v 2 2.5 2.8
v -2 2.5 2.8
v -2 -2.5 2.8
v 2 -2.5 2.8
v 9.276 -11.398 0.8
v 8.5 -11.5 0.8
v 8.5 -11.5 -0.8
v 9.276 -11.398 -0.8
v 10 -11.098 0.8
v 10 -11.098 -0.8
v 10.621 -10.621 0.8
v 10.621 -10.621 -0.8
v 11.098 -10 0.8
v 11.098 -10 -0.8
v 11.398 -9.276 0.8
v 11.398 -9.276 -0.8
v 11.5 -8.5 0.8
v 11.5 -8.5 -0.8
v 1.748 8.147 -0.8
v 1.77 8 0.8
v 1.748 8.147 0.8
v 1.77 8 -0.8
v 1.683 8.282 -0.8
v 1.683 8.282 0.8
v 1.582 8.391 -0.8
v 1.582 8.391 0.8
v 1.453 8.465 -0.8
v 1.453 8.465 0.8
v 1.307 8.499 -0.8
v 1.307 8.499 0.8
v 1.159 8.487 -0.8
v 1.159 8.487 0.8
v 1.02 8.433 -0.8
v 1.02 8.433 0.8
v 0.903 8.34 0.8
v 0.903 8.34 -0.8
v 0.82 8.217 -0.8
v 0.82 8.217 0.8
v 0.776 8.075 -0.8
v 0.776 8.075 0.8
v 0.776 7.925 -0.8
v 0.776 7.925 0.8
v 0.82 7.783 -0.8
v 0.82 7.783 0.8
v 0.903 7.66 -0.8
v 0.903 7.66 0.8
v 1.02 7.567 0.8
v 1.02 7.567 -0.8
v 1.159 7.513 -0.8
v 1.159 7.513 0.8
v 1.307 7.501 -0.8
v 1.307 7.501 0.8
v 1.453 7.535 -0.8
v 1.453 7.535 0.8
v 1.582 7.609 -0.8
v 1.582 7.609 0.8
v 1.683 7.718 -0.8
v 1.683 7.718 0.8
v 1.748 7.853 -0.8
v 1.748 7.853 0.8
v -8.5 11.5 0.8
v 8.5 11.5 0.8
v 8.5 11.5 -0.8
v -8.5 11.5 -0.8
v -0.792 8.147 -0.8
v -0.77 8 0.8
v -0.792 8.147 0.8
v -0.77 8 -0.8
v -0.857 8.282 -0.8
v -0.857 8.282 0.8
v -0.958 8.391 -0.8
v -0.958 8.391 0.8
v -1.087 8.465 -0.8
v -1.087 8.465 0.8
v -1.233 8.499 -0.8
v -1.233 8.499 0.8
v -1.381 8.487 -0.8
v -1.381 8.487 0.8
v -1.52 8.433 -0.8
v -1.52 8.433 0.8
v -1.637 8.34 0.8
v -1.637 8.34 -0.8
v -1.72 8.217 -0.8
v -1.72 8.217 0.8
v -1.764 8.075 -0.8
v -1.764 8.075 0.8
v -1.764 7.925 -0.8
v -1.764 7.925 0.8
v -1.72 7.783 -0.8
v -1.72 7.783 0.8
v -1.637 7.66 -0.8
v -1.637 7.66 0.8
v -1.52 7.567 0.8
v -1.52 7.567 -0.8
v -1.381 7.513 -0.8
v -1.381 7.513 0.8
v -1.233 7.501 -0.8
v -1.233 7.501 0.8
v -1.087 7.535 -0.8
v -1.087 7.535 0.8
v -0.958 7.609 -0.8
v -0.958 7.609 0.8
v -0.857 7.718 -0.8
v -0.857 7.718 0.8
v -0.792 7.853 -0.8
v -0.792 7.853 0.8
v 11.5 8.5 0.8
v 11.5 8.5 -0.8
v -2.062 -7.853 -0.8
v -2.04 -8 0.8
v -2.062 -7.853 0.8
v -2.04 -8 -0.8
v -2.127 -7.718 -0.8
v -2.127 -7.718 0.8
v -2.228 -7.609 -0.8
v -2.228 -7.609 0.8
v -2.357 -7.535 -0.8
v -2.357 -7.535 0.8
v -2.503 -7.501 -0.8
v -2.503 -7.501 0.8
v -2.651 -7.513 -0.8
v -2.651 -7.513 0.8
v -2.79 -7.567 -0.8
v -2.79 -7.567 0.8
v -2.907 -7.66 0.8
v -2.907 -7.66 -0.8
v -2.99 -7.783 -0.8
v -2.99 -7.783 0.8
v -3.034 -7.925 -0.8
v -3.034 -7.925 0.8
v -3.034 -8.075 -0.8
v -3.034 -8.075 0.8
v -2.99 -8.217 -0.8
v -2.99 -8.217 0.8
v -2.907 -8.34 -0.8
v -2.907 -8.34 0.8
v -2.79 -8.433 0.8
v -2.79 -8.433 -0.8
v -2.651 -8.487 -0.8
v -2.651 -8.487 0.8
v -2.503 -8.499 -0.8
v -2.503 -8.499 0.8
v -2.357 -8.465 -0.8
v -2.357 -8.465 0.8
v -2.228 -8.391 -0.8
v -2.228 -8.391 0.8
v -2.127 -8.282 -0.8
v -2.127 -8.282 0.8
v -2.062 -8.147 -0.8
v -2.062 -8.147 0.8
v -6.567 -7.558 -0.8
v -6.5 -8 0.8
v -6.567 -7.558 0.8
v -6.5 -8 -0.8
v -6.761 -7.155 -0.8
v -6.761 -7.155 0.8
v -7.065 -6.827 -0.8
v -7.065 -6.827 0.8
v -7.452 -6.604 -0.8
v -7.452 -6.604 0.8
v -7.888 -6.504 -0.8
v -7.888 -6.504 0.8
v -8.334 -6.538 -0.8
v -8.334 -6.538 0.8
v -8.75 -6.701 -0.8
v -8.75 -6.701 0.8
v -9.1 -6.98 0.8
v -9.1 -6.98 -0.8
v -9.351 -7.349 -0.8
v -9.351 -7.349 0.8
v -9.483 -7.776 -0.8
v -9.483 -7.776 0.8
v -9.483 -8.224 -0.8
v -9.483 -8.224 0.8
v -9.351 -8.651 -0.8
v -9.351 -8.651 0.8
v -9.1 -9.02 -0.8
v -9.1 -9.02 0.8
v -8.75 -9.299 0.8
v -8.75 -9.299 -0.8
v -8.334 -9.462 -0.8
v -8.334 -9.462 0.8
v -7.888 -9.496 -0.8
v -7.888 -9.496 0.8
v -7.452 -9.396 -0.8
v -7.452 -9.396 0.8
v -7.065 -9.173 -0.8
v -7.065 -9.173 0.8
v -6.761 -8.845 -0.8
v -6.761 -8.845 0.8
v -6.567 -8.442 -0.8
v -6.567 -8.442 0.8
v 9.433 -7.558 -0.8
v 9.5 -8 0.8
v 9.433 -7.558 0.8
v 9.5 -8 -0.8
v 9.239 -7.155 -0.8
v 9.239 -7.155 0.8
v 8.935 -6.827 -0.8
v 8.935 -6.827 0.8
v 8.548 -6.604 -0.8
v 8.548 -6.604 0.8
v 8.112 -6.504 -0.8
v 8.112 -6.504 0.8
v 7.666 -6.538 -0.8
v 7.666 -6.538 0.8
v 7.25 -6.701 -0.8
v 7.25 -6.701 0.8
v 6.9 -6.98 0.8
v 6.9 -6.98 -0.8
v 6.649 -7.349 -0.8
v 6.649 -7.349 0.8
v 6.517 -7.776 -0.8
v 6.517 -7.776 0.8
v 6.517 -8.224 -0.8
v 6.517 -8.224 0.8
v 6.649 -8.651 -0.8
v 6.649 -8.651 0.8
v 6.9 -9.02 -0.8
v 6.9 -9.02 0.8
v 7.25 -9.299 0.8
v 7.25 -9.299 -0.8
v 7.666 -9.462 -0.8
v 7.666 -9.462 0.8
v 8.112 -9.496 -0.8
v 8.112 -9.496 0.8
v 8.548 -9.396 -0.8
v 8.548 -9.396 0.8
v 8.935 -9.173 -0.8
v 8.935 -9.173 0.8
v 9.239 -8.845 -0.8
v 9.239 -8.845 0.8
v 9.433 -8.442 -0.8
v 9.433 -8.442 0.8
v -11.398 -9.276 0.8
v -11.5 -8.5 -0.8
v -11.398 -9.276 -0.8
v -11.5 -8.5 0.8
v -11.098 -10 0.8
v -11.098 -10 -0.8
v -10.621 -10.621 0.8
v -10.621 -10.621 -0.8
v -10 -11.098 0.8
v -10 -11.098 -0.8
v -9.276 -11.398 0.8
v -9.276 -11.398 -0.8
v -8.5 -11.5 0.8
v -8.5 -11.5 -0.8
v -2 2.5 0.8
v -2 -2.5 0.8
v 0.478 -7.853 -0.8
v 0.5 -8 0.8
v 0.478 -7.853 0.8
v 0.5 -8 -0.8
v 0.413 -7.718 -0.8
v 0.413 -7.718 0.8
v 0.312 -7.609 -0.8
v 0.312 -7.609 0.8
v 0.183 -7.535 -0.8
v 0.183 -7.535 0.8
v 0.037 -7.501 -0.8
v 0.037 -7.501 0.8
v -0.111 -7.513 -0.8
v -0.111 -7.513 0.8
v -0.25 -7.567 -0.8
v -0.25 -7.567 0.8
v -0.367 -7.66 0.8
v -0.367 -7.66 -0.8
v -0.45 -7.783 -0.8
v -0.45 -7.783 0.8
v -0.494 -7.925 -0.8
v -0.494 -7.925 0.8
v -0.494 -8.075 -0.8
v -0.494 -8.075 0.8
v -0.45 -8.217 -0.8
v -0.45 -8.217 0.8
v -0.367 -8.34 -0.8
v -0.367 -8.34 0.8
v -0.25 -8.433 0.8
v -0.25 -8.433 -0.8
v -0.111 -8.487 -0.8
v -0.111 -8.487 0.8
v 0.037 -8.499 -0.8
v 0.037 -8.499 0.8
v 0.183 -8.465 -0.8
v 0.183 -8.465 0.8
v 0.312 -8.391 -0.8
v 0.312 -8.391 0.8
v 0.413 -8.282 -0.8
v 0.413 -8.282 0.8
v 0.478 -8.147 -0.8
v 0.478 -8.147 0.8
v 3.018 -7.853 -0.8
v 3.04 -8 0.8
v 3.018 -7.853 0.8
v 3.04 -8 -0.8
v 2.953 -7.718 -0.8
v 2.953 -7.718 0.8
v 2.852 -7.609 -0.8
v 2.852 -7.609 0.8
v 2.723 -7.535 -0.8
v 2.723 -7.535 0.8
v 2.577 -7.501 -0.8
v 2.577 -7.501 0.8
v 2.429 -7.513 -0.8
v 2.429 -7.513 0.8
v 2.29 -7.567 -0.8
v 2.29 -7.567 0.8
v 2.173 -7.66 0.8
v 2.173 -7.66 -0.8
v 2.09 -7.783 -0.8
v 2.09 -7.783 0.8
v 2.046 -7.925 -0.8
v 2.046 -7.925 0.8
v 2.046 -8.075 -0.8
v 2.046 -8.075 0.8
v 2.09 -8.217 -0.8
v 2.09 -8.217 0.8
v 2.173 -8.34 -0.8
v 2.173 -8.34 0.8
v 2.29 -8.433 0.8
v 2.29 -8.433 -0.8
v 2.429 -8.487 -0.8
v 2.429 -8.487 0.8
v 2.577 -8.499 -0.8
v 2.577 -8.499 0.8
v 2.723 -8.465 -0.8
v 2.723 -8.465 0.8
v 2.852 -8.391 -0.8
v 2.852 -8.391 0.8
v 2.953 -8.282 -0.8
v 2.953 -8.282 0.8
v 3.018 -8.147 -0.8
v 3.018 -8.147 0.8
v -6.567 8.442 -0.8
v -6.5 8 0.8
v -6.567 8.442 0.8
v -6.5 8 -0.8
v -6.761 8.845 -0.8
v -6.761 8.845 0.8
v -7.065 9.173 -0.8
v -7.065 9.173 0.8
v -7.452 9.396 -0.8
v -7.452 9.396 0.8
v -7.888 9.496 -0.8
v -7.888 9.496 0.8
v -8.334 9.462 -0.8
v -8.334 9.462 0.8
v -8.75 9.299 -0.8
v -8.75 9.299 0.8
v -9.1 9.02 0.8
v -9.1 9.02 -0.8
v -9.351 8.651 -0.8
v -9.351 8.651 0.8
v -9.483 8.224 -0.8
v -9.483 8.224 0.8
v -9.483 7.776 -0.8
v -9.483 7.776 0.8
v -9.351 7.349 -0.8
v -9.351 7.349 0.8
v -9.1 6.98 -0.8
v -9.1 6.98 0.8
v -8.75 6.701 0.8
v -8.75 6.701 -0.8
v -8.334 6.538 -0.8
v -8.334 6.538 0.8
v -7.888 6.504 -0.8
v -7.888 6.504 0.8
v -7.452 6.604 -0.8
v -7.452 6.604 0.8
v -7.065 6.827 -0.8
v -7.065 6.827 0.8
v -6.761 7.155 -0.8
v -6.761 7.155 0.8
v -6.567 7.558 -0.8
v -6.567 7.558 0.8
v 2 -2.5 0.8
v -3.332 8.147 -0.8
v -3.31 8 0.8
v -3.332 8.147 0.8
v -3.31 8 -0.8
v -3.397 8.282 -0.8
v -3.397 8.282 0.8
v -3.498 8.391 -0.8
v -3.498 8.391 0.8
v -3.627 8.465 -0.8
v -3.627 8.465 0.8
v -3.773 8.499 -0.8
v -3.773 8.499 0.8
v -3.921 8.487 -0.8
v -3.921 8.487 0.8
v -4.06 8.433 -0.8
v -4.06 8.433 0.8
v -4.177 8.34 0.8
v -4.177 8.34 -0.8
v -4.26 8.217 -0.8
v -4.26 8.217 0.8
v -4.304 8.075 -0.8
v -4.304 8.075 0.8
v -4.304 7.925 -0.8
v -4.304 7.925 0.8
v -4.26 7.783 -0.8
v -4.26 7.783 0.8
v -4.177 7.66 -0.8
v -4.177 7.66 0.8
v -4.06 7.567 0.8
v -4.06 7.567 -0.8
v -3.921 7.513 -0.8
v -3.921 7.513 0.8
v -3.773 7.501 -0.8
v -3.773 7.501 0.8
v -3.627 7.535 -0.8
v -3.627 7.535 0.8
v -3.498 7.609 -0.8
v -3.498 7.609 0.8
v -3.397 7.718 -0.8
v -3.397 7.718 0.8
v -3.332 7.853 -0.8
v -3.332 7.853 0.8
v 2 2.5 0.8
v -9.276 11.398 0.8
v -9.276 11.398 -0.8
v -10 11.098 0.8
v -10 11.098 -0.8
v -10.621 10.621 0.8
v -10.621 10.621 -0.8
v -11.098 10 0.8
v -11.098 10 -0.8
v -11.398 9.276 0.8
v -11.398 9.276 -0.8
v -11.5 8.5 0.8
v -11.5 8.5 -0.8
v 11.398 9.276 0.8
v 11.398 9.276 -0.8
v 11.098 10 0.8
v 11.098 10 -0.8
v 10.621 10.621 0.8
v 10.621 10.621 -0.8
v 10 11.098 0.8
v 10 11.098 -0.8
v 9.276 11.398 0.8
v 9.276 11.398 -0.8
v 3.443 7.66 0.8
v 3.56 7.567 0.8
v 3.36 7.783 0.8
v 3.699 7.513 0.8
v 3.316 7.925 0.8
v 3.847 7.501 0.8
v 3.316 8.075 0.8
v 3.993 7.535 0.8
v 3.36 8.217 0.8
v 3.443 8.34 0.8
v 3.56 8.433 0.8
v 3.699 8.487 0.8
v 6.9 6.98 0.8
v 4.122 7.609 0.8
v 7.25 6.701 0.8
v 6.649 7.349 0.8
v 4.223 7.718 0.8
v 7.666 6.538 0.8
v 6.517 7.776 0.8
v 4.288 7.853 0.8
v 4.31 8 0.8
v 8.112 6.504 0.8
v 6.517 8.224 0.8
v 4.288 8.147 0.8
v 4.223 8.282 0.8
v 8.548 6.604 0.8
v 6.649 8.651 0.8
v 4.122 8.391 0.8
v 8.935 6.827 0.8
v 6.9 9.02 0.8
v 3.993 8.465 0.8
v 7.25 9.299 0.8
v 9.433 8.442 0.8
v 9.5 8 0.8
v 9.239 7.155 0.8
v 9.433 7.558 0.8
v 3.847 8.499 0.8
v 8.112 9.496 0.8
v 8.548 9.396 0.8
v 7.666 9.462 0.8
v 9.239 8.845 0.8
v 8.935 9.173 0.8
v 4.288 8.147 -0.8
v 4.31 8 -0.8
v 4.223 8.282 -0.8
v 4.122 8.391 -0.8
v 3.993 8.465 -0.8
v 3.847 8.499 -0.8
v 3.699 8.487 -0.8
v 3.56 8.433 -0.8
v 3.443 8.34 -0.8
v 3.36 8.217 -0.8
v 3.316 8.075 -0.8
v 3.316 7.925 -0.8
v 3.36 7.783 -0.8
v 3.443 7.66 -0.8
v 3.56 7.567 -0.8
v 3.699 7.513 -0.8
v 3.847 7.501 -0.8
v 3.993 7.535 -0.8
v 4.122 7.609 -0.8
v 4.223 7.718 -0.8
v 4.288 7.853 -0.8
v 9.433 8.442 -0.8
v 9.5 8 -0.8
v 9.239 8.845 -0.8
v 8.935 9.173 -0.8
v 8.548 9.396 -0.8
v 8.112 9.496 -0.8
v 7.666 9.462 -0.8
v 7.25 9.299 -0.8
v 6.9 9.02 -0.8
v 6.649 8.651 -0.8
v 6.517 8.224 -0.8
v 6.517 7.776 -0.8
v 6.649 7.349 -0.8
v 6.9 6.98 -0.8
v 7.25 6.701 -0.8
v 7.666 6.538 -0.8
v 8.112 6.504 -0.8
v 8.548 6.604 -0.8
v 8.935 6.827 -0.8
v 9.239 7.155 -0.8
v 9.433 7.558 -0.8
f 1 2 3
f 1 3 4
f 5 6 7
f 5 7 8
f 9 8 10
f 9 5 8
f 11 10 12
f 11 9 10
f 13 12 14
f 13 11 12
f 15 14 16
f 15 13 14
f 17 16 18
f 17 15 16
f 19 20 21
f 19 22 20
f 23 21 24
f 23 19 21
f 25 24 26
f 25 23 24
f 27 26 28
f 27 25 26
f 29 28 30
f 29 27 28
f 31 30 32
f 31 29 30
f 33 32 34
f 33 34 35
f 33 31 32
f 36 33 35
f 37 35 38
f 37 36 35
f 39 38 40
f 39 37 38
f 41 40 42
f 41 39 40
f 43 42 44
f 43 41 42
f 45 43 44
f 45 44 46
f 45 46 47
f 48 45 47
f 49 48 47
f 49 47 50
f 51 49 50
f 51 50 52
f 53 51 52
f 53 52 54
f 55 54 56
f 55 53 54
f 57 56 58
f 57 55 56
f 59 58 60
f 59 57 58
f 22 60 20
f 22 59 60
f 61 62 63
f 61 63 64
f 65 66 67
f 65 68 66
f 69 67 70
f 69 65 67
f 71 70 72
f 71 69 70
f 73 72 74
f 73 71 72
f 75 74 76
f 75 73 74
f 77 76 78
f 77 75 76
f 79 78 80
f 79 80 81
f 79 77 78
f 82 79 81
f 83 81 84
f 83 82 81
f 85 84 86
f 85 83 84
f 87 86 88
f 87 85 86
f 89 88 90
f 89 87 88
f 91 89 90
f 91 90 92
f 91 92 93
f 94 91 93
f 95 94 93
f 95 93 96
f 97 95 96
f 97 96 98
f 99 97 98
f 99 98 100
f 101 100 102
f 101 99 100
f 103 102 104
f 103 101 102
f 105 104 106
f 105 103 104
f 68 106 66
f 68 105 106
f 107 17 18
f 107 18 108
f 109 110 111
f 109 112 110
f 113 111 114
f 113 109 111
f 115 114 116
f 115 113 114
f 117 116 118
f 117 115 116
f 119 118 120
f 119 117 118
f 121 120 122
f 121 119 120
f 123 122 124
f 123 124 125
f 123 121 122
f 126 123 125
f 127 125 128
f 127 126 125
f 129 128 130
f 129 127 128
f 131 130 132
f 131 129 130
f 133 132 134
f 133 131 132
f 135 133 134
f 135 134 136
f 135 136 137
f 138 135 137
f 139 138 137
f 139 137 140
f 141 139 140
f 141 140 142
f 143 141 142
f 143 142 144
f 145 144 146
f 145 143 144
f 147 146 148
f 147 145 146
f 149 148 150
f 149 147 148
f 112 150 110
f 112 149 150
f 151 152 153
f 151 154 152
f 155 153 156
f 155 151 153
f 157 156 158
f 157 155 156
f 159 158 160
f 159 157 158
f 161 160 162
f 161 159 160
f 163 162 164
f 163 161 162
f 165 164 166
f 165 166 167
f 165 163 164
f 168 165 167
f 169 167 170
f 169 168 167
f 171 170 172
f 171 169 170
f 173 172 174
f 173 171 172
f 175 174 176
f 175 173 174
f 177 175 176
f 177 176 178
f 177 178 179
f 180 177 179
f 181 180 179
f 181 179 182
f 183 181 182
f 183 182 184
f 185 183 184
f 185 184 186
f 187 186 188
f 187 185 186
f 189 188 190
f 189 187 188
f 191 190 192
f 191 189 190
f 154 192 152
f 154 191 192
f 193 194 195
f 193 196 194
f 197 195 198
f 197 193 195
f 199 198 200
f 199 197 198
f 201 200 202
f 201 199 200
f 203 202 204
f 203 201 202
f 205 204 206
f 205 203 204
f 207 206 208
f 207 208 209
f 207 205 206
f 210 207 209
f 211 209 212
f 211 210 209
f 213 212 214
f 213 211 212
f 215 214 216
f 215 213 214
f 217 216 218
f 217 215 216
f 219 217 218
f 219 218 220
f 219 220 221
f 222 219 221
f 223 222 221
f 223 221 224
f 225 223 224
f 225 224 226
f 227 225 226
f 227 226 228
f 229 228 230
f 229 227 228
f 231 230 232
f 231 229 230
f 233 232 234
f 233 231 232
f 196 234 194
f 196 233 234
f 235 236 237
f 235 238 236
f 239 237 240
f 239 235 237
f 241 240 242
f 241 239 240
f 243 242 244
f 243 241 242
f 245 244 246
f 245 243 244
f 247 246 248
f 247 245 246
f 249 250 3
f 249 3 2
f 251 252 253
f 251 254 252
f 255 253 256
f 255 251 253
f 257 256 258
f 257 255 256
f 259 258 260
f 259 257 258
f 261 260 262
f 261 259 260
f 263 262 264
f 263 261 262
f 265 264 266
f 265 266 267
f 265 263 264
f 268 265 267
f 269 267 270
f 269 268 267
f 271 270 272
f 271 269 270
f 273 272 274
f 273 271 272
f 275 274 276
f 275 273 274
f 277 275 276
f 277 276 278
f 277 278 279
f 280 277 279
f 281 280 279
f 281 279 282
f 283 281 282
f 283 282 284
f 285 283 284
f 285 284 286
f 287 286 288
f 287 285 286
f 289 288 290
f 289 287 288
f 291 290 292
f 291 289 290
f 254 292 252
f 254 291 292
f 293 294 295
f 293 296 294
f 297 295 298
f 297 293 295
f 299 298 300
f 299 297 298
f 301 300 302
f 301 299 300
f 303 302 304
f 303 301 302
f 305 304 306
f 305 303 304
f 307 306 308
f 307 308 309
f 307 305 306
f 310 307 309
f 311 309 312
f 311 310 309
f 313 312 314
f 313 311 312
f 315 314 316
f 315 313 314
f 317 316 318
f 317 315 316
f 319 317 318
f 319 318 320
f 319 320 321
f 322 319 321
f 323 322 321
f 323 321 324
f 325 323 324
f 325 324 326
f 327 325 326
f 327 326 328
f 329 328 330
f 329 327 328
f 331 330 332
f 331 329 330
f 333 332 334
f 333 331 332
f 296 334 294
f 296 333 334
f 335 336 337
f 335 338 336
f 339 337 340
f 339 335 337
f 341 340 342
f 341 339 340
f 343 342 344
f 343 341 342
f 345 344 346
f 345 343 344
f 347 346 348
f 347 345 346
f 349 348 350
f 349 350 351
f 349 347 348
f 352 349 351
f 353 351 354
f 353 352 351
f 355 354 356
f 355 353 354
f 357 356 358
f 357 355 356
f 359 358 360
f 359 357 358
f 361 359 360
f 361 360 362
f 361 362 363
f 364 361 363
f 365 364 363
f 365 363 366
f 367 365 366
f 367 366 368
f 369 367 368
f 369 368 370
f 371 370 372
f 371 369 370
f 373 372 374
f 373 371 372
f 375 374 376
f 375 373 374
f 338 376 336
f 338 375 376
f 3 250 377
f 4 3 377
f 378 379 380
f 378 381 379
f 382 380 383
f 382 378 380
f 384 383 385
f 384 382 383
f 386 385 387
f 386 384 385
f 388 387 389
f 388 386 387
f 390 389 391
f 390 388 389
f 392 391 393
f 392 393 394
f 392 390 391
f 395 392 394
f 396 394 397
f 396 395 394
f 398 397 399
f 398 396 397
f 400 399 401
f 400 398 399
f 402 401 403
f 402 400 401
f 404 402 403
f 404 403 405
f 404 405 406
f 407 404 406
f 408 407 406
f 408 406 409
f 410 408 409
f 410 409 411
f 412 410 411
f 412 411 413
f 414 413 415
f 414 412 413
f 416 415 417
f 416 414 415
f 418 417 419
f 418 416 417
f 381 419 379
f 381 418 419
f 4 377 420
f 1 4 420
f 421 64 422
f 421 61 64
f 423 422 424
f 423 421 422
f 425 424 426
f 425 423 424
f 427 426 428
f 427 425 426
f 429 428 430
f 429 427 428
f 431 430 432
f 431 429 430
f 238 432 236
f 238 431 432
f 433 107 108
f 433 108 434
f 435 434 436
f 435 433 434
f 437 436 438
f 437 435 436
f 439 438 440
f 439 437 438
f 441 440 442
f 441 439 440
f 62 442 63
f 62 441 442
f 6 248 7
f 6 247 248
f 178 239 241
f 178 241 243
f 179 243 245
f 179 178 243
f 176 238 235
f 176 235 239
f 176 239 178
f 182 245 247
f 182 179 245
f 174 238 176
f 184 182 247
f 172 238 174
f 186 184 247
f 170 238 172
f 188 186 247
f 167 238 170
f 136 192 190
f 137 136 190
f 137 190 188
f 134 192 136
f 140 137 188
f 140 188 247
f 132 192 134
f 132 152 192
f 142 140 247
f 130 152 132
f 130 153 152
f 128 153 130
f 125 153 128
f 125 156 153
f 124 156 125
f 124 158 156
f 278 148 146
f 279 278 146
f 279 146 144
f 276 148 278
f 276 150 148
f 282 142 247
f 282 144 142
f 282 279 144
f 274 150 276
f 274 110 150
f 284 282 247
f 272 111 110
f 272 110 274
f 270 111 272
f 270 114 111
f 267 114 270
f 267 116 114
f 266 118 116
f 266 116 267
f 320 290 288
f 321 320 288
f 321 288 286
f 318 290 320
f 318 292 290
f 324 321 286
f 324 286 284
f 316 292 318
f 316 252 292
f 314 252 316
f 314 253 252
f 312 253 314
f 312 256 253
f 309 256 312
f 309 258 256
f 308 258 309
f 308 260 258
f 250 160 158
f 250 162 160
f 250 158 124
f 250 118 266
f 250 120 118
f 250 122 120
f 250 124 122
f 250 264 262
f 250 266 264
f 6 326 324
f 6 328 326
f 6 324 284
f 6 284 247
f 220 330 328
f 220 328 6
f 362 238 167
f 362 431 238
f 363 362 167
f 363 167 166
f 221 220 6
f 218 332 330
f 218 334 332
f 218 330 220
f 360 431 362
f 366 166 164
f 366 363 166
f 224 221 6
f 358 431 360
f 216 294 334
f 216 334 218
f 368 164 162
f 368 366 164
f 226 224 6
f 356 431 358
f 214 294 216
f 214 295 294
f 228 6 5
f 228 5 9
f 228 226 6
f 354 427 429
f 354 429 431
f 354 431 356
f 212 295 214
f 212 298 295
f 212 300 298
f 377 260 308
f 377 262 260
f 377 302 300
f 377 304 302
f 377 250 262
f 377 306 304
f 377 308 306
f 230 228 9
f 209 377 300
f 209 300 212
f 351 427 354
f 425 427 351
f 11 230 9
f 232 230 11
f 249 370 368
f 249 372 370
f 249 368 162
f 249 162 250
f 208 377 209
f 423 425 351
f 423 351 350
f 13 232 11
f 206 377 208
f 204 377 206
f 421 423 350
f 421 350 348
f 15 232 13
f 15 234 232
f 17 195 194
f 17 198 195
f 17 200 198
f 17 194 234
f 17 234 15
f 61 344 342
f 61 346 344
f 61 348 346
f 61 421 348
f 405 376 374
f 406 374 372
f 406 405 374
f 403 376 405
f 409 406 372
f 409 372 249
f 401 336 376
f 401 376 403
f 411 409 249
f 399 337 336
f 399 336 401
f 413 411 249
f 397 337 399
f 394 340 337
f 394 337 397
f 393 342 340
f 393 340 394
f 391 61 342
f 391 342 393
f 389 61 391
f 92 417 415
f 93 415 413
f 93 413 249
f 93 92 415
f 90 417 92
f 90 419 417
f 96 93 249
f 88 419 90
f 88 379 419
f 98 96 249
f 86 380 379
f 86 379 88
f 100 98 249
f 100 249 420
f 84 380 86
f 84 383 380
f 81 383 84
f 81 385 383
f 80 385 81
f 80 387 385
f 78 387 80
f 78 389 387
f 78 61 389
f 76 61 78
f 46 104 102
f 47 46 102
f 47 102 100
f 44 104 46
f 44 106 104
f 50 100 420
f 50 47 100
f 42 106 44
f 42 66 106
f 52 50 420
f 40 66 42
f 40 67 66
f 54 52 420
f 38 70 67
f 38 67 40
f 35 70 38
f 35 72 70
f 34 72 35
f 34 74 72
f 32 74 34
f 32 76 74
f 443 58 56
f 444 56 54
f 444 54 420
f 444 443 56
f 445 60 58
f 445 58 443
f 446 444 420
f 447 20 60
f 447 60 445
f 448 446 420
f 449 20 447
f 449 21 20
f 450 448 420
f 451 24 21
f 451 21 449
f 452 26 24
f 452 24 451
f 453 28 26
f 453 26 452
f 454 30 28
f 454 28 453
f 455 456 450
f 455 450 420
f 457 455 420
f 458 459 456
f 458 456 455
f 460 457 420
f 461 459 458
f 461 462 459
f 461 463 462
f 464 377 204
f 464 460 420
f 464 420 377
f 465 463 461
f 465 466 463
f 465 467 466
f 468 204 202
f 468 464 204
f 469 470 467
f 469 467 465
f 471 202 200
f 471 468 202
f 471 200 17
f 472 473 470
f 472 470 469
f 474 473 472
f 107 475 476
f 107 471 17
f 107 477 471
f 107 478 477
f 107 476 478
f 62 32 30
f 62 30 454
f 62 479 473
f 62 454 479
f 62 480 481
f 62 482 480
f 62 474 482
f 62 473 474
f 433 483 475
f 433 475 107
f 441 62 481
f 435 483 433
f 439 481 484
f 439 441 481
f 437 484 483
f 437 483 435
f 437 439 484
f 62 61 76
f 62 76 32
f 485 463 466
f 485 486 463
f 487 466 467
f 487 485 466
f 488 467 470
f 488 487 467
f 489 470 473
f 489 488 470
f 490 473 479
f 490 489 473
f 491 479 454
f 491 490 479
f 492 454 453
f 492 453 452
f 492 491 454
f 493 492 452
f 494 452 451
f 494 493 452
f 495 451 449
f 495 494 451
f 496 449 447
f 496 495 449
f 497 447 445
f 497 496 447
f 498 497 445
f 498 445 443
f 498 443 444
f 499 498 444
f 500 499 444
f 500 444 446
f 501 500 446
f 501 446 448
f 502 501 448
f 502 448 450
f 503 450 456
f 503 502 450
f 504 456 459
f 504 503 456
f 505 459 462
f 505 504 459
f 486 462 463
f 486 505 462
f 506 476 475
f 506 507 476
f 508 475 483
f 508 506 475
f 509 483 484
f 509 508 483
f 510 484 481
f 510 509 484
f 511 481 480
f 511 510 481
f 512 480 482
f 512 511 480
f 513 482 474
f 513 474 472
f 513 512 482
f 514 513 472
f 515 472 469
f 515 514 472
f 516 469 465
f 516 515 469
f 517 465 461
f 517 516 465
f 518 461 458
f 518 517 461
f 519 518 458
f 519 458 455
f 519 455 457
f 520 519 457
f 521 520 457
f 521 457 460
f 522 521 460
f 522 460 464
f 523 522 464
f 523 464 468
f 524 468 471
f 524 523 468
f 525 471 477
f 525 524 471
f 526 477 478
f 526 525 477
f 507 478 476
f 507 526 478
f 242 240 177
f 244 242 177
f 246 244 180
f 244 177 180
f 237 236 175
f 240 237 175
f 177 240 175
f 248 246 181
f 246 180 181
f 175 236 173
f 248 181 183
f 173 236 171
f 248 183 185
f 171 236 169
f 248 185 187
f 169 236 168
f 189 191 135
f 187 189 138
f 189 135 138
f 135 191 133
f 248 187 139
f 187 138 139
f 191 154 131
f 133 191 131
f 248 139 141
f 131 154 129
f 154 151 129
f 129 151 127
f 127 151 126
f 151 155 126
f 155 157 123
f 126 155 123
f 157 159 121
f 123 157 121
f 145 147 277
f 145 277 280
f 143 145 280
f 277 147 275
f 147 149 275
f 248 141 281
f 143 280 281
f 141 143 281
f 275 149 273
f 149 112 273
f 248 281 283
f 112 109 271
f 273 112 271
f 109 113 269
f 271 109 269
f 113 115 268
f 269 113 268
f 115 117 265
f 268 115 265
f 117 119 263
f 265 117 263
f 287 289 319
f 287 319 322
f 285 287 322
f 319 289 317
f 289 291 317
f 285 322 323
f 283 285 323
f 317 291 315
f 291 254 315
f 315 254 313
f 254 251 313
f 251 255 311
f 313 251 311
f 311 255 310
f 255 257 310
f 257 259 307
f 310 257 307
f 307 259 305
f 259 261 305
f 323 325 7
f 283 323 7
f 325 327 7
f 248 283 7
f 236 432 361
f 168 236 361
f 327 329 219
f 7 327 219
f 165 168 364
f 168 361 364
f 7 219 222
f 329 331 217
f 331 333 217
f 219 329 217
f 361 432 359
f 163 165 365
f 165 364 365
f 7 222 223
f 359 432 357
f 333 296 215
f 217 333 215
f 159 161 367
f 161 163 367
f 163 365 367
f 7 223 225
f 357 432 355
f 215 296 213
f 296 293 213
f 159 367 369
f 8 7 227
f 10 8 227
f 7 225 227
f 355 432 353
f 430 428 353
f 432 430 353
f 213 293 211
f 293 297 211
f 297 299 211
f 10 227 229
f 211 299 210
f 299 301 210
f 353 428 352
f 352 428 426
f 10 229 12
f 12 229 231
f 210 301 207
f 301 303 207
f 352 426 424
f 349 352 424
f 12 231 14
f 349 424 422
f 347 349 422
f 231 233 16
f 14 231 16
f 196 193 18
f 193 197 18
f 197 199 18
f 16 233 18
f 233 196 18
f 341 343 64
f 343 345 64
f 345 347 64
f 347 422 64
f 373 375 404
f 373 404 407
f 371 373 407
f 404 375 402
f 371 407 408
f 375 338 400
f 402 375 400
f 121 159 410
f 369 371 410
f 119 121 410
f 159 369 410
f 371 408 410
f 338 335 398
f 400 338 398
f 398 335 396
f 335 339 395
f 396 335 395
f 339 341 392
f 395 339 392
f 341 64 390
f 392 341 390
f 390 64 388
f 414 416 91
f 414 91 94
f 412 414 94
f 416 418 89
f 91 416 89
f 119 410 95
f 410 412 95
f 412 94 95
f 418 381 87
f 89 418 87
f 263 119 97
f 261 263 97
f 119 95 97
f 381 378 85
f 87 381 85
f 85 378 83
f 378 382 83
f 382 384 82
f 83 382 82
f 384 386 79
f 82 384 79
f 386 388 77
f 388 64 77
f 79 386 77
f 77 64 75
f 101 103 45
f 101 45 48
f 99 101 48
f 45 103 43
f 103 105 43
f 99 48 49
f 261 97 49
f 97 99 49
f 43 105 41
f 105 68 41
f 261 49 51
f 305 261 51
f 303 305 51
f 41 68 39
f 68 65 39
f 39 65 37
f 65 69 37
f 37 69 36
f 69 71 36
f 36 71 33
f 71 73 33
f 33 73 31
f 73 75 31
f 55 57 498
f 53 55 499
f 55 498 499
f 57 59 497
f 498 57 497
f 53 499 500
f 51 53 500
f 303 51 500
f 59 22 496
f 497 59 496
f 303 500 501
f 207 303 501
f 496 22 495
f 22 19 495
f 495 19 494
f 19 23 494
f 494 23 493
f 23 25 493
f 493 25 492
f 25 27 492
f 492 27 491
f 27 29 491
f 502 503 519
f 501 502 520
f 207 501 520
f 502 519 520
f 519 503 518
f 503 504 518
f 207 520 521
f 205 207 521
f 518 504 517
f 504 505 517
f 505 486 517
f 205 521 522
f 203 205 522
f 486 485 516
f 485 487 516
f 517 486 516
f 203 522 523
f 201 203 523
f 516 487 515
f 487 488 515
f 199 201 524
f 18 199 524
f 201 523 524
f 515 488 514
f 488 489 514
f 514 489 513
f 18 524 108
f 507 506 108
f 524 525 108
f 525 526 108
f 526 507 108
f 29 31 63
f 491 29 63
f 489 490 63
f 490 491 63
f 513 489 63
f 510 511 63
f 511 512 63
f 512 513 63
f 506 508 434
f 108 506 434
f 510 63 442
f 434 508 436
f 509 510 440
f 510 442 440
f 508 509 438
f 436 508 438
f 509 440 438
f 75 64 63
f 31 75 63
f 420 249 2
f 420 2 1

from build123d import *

# Parameters (mm, degrees)
SKETCH1_R           = 1.5
SKETCH1_R_2         = 0.5
BOSS_EXTRUDE1_DEPTH = 0.8
SKETCH2_W           = 4
SKETCH2_H           = 5
BOSS_EXTRUDE2_DEPTH = 2


with BuildPart() as part:
    # Sketch1 → Boss-Extrude1 (new body, symmetric)
    with BuildSketch(Plane.XY):
        with BuildLine():
            Line((-8.5, -11.5), (8.5, -11.5))
            ThreePointArc((8.5, -11.5), (10.621320344, -10.621320344), (11.5, -8.5))
            Line((11.5, -8.5), (11.5, 8.5))
            ThreePointArc((11.5, 8.5), (10.621320344, 10.621320344), (8.5, 11.5))
            Line((8.5, 11.5), (-8.5, 11.5))
            ThreePointArc((-8.5, 11.5), (-10.621320344, 10.621320344), (-11.5, 8.5))
            Line((-11.5, 8.5), (-11.5, -8.5))
            ThreePointArc((-11.5, -8.5), (-10.621320344, -10.621320344), (-8.5, -11.5))
        make_face()
        with Locations((-8, 8)):
            Circle(SKETCH1_R, mode=Mode.SUBTRACT)
        with Locations((8, 8)):
            Circle(SKETCH1_R, mode=Mode.SUBTRACT)
        with Locations((8, -8)):
            Circle(SKETCH1_R, mode=Mode.SUBTRACT)
        with Locations((-8, -8)):
            Circle(SKETCH1_R, mode=Mode.SUBTRACT)
        with Locations((0, -8)):
            Circle(SKETCH1_R_2, mode=Mode.SUBTRACT)
        with Locations((-2.54, -8)):
            Circle(SKETCH1_R_2, mode=Mode.SUBTRACT)
        with Locations((2.54, -8)):
            Circle(SKETCH1_R_2, mode=Mode.SUBTRACT)
        with Locations((-1.27, 8)):
            Circle(SKETCH1_R_2, mode=Mode.SUBTRACT)
        with Locations((1.27, 8)):
            Circle(SKETCH1_R_2, mode=Mode.SUBTRACT)
        with Locations((-3.81, 8)):
            Circle(SKETCH1_R_2, mode=Mode.SUBTRACT)
        with Locations((3.81, 8)):
            Circle(SKETCH1_R_2, mode=Mode.SUBTRACT)
    extrude(amount=BOSS_EXTRUDE1_DEPTH, both=True)

    # Sketch2 → Boss-Extrude2 (add)
    with BuildSketch(Plane.XY.offset(0.8)):
        Rectangle(SKETCH2_W, SKETCH2_H)
    extrude(amount=BOSS_EXTRUDE2_DEPTH)


solid = part.part
